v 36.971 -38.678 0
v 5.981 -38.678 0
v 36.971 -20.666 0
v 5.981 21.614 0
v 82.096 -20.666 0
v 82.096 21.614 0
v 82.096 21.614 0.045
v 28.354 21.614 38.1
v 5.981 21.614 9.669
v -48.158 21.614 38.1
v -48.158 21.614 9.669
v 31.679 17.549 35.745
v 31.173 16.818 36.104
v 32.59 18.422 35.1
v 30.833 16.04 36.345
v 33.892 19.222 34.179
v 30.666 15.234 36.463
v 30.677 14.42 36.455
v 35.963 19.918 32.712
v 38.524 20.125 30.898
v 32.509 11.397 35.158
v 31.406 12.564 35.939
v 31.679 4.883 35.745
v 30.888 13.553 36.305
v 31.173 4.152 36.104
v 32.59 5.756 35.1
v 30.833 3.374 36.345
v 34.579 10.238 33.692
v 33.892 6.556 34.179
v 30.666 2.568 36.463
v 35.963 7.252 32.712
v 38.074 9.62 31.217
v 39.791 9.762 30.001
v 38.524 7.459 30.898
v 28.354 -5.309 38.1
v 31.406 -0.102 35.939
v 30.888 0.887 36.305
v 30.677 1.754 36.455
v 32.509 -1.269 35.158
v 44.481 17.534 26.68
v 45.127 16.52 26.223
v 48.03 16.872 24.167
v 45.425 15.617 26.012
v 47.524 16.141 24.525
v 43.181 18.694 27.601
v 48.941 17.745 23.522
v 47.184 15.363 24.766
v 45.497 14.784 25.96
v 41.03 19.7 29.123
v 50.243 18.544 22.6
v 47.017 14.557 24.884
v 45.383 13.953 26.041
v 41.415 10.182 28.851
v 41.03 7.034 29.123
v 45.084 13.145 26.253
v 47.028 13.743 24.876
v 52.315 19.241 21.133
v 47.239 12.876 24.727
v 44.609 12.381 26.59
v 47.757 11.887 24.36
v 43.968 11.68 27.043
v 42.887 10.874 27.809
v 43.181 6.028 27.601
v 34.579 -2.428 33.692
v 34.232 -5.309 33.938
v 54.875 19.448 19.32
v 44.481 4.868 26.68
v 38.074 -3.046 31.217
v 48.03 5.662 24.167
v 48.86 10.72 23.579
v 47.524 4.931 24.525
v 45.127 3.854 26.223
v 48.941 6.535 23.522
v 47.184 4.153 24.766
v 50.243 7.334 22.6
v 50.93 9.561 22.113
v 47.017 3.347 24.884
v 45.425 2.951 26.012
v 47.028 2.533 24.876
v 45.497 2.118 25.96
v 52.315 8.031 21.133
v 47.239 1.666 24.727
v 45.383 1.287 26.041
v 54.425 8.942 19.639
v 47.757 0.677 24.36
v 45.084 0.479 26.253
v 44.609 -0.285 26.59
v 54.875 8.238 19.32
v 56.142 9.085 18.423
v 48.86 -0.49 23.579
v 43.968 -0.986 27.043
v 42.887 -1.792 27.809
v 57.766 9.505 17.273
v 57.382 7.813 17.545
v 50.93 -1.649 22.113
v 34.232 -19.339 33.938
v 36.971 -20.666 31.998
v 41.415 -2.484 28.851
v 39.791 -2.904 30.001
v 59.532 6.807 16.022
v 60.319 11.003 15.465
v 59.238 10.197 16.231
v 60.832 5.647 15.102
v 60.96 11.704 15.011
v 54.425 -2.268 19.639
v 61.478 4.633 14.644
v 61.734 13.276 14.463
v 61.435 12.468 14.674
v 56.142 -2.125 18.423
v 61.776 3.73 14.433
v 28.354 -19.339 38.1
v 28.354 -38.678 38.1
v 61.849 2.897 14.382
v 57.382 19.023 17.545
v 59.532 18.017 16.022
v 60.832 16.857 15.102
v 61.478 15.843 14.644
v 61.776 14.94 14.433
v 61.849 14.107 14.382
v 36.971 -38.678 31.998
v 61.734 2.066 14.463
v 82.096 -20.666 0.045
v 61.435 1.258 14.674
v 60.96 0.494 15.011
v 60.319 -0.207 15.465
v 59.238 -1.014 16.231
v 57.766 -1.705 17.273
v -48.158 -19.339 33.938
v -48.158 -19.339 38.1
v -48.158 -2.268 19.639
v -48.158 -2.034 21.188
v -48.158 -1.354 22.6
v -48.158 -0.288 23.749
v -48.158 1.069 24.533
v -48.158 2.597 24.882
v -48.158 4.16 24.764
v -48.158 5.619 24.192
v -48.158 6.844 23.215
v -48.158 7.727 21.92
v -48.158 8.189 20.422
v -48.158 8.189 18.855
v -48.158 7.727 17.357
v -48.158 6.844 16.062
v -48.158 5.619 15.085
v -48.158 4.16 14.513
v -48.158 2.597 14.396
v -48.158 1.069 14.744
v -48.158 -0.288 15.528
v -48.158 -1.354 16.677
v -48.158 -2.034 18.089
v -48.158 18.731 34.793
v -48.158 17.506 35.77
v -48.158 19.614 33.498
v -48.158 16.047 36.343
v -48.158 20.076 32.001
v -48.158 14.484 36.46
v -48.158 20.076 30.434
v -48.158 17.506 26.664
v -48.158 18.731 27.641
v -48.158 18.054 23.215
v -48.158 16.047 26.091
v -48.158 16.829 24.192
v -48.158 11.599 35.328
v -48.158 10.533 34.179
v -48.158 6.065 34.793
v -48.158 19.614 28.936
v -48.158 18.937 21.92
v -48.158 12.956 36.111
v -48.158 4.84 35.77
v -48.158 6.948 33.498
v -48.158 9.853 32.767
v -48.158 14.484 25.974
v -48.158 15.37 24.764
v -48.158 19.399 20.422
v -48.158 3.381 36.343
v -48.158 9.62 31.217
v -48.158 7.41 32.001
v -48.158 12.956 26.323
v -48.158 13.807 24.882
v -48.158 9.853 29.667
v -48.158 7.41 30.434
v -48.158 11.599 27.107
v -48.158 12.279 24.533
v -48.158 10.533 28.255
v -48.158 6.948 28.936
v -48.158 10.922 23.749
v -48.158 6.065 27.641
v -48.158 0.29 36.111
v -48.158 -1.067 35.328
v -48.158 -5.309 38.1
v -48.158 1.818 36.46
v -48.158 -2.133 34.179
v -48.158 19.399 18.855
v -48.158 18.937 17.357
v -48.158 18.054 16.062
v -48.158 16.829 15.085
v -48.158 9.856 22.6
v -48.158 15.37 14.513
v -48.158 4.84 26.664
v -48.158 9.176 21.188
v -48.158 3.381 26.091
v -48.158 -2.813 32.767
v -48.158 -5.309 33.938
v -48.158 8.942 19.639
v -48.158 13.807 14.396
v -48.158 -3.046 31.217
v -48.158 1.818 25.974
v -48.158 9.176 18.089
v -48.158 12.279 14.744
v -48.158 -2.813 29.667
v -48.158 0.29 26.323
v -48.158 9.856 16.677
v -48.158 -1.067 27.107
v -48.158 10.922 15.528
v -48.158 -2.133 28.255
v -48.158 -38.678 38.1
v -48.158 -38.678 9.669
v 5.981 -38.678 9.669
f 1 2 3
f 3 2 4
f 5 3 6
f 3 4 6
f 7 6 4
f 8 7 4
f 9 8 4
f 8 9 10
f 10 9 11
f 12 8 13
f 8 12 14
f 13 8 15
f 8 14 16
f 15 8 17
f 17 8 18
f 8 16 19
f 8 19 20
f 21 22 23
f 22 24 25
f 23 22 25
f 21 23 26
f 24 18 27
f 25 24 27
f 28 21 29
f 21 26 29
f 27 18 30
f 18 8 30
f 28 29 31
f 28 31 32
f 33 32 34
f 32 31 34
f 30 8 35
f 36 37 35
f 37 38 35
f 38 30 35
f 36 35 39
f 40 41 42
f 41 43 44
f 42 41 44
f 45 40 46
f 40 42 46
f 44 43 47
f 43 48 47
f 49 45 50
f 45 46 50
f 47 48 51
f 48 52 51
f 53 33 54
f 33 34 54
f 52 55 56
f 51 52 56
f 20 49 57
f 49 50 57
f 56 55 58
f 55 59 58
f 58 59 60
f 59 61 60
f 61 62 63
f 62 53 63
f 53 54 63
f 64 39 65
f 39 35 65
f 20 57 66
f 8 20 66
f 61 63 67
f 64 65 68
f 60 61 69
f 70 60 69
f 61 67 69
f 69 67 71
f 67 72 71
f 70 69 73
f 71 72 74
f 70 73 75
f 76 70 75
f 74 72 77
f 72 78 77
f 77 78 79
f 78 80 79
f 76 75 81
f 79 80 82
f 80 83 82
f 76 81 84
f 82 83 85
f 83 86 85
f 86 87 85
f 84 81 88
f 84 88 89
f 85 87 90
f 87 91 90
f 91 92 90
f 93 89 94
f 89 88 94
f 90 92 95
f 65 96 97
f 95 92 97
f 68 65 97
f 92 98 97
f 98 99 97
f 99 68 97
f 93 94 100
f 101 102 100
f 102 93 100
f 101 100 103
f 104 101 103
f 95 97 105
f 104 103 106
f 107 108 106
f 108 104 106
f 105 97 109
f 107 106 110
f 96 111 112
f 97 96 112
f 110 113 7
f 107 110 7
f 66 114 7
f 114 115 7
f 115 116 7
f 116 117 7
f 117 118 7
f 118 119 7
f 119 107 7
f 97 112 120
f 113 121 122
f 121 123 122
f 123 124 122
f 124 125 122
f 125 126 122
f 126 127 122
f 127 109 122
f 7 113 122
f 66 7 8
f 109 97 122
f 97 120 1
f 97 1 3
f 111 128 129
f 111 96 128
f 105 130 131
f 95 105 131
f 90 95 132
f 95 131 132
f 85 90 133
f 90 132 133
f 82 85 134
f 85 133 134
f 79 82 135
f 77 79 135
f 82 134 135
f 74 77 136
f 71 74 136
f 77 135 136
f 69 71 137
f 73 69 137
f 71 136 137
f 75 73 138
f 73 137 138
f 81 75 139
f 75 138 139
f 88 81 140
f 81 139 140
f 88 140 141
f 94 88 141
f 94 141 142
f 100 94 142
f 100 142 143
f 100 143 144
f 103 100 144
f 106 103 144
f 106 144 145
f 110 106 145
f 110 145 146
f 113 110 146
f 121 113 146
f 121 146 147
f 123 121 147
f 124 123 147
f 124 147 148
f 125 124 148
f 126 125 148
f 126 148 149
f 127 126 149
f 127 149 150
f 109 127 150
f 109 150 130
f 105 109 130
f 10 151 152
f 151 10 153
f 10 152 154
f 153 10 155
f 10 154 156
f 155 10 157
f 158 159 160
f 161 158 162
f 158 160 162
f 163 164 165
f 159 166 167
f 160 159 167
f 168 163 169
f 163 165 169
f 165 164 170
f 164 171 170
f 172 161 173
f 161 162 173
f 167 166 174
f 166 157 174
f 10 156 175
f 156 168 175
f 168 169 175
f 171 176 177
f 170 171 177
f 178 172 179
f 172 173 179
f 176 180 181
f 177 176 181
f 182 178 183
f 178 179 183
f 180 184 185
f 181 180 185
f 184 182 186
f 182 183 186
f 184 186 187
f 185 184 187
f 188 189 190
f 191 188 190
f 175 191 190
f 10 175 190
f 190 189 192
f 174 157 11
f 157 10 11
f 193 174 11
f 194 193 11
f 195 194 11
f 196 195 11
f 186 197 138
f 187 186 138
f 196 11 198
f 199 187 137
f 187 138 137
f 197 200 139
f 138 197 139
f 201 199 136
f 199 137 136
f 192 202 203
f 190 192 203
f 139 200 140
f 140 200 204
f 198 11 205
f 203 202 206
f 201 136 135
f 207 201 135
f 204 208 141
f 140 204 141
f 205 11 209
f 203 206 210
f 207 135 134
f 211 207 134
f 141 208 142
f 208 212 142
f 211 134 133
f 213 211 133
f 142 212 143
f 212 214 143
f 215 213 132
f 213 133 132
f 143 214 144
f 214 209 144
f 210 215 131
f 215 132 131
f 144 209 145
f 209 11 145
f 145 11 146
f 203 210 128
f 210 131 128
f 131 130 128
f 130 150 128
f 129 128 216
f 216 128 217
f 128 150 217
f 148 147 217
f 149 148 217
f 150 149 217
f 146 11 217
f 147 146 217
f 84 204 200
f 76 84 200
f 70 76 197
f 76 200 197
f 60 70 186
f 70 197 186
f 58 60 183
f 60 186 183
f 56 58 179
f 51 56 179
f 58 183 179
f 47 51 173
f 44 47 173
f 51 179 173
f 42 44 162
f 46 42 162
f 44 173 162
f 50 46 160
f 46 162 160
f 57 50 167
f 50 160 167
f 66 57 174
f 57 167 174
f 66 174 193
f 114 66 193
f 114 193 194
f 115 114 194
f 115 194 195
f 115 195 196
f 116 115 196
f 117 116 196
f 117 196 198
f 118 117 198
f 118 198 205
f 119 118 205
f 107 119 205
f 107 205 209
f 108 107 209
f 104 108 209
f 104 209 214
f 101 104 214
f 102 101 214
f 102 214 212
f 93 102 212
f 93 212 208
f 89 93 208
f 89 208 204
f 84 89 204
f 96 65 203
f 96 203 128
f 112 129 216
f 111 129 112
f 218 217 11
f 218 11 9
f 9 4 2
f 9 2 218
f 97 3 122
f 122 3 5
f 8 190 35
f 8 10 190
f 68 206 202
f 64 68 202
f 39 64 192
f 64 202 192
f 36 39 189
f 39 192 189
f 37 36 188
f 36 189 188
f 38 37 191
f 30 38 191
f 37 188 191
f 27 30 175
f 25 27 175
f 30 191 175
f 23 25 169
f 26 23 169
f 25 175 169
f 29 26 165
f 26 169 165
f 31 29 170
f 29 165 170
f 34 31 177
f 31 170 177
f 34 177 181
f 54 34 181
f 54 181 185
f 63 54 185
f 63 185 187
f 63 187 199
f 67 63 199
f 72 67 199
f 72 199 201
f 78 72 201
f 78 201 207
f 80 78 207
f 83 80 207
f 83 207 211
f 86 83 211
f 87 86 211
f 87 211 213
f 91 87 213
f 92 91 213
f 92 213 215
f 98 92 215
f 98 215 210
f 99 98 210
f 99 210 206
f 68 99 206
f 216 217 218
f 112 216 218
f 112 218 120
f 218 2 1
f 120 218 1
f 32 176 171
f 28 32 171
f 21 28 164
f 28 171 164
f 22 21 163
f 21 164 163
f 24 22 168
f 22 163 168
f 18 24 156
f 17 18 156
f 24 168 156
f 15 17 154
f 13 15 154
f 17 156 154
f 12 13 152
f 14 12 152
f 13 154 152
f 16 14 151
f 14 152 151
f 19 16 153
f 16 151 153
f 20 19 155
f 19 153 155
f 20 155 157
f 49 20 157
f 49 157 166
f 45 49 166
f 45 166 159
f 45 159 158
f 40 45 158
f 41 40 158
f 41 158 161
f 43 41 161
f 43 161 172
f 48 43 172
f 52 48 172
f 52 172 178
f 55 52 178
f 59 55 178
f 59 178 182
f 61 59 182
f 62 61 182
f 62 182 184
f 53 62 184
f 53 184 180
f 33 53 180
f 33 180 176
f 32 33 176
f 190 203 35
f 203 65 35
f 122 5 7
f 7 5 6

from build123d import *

# Parameters (mm, degrees)
F1_DEPTH = 38.1
F3_DEPTH = 60.292894
F5_R     = 5.25769
F5_W     = 14.030187
F5_H     = 4.162106
F6_DEPTH = 130.254248
F4_W     = 54.139016
F4_H     = 9.669455
F7_DEPTH = 60.292894


with BuildPart() as f1:
    # F0 (on Top) → F1 (new body)
    with BuildSketch(Plane.XY):
        Polygon((82.095571, 21.614075), (-48.157677, 21.614075), (-48.157677, -38.677819), (36.971442, -38.677819), (36.971442, -20.666091), (82.095571, -20.666091), align=None)
    extrude(amount=F1_DEPTH)

    # F2 (on face) → F3 (cut, through all)
    with BuildSketch(Plane.XZ.offset(38.677819)):
        Polygon((82.158446, 38.1), (28.353805, 38.1), (82.158446, 0), align=None)
    extrude(amount=-F3_DEPTH, mode=Mode.SUBTRACT)

    # F5 (on face) → F6 (cut, through all)
    with BuildSketch(Plane(origin=(-48.157677, 0, 0), x_dir=(0, -1, 0), z_dir=(-1, 0, 0))):
        with Locations((-14.877267, 31.217162)):
            Circle(F5_R)
        with Locations((-2.21119, 31.217162)):
            Circle(F5_R)
        with Locations((-2.990069, 19.638609)):
            Circle(F5_R)
        with Locations((-14.2001, 19.638609)):
            Circle(F5_R)
        with Locations((12.323814, 36.018947)):
            Rectangle(F5_W, F5_H)
    extrude(amount=-F6_DEPTH, mode=Mode.SUBTRACT)

    # F4 (on face) → F7 (cut, through all)
    with BuildSketch(Plane.XZ.offset(38.677819)):
        with Locations((-21.088169, 4.834727)):
            Rectangle(F4_W, F4_H)
    extrude(amount=-F7_DEPTH, mode=Mode.SUBTRACT)


solid = f1.part
